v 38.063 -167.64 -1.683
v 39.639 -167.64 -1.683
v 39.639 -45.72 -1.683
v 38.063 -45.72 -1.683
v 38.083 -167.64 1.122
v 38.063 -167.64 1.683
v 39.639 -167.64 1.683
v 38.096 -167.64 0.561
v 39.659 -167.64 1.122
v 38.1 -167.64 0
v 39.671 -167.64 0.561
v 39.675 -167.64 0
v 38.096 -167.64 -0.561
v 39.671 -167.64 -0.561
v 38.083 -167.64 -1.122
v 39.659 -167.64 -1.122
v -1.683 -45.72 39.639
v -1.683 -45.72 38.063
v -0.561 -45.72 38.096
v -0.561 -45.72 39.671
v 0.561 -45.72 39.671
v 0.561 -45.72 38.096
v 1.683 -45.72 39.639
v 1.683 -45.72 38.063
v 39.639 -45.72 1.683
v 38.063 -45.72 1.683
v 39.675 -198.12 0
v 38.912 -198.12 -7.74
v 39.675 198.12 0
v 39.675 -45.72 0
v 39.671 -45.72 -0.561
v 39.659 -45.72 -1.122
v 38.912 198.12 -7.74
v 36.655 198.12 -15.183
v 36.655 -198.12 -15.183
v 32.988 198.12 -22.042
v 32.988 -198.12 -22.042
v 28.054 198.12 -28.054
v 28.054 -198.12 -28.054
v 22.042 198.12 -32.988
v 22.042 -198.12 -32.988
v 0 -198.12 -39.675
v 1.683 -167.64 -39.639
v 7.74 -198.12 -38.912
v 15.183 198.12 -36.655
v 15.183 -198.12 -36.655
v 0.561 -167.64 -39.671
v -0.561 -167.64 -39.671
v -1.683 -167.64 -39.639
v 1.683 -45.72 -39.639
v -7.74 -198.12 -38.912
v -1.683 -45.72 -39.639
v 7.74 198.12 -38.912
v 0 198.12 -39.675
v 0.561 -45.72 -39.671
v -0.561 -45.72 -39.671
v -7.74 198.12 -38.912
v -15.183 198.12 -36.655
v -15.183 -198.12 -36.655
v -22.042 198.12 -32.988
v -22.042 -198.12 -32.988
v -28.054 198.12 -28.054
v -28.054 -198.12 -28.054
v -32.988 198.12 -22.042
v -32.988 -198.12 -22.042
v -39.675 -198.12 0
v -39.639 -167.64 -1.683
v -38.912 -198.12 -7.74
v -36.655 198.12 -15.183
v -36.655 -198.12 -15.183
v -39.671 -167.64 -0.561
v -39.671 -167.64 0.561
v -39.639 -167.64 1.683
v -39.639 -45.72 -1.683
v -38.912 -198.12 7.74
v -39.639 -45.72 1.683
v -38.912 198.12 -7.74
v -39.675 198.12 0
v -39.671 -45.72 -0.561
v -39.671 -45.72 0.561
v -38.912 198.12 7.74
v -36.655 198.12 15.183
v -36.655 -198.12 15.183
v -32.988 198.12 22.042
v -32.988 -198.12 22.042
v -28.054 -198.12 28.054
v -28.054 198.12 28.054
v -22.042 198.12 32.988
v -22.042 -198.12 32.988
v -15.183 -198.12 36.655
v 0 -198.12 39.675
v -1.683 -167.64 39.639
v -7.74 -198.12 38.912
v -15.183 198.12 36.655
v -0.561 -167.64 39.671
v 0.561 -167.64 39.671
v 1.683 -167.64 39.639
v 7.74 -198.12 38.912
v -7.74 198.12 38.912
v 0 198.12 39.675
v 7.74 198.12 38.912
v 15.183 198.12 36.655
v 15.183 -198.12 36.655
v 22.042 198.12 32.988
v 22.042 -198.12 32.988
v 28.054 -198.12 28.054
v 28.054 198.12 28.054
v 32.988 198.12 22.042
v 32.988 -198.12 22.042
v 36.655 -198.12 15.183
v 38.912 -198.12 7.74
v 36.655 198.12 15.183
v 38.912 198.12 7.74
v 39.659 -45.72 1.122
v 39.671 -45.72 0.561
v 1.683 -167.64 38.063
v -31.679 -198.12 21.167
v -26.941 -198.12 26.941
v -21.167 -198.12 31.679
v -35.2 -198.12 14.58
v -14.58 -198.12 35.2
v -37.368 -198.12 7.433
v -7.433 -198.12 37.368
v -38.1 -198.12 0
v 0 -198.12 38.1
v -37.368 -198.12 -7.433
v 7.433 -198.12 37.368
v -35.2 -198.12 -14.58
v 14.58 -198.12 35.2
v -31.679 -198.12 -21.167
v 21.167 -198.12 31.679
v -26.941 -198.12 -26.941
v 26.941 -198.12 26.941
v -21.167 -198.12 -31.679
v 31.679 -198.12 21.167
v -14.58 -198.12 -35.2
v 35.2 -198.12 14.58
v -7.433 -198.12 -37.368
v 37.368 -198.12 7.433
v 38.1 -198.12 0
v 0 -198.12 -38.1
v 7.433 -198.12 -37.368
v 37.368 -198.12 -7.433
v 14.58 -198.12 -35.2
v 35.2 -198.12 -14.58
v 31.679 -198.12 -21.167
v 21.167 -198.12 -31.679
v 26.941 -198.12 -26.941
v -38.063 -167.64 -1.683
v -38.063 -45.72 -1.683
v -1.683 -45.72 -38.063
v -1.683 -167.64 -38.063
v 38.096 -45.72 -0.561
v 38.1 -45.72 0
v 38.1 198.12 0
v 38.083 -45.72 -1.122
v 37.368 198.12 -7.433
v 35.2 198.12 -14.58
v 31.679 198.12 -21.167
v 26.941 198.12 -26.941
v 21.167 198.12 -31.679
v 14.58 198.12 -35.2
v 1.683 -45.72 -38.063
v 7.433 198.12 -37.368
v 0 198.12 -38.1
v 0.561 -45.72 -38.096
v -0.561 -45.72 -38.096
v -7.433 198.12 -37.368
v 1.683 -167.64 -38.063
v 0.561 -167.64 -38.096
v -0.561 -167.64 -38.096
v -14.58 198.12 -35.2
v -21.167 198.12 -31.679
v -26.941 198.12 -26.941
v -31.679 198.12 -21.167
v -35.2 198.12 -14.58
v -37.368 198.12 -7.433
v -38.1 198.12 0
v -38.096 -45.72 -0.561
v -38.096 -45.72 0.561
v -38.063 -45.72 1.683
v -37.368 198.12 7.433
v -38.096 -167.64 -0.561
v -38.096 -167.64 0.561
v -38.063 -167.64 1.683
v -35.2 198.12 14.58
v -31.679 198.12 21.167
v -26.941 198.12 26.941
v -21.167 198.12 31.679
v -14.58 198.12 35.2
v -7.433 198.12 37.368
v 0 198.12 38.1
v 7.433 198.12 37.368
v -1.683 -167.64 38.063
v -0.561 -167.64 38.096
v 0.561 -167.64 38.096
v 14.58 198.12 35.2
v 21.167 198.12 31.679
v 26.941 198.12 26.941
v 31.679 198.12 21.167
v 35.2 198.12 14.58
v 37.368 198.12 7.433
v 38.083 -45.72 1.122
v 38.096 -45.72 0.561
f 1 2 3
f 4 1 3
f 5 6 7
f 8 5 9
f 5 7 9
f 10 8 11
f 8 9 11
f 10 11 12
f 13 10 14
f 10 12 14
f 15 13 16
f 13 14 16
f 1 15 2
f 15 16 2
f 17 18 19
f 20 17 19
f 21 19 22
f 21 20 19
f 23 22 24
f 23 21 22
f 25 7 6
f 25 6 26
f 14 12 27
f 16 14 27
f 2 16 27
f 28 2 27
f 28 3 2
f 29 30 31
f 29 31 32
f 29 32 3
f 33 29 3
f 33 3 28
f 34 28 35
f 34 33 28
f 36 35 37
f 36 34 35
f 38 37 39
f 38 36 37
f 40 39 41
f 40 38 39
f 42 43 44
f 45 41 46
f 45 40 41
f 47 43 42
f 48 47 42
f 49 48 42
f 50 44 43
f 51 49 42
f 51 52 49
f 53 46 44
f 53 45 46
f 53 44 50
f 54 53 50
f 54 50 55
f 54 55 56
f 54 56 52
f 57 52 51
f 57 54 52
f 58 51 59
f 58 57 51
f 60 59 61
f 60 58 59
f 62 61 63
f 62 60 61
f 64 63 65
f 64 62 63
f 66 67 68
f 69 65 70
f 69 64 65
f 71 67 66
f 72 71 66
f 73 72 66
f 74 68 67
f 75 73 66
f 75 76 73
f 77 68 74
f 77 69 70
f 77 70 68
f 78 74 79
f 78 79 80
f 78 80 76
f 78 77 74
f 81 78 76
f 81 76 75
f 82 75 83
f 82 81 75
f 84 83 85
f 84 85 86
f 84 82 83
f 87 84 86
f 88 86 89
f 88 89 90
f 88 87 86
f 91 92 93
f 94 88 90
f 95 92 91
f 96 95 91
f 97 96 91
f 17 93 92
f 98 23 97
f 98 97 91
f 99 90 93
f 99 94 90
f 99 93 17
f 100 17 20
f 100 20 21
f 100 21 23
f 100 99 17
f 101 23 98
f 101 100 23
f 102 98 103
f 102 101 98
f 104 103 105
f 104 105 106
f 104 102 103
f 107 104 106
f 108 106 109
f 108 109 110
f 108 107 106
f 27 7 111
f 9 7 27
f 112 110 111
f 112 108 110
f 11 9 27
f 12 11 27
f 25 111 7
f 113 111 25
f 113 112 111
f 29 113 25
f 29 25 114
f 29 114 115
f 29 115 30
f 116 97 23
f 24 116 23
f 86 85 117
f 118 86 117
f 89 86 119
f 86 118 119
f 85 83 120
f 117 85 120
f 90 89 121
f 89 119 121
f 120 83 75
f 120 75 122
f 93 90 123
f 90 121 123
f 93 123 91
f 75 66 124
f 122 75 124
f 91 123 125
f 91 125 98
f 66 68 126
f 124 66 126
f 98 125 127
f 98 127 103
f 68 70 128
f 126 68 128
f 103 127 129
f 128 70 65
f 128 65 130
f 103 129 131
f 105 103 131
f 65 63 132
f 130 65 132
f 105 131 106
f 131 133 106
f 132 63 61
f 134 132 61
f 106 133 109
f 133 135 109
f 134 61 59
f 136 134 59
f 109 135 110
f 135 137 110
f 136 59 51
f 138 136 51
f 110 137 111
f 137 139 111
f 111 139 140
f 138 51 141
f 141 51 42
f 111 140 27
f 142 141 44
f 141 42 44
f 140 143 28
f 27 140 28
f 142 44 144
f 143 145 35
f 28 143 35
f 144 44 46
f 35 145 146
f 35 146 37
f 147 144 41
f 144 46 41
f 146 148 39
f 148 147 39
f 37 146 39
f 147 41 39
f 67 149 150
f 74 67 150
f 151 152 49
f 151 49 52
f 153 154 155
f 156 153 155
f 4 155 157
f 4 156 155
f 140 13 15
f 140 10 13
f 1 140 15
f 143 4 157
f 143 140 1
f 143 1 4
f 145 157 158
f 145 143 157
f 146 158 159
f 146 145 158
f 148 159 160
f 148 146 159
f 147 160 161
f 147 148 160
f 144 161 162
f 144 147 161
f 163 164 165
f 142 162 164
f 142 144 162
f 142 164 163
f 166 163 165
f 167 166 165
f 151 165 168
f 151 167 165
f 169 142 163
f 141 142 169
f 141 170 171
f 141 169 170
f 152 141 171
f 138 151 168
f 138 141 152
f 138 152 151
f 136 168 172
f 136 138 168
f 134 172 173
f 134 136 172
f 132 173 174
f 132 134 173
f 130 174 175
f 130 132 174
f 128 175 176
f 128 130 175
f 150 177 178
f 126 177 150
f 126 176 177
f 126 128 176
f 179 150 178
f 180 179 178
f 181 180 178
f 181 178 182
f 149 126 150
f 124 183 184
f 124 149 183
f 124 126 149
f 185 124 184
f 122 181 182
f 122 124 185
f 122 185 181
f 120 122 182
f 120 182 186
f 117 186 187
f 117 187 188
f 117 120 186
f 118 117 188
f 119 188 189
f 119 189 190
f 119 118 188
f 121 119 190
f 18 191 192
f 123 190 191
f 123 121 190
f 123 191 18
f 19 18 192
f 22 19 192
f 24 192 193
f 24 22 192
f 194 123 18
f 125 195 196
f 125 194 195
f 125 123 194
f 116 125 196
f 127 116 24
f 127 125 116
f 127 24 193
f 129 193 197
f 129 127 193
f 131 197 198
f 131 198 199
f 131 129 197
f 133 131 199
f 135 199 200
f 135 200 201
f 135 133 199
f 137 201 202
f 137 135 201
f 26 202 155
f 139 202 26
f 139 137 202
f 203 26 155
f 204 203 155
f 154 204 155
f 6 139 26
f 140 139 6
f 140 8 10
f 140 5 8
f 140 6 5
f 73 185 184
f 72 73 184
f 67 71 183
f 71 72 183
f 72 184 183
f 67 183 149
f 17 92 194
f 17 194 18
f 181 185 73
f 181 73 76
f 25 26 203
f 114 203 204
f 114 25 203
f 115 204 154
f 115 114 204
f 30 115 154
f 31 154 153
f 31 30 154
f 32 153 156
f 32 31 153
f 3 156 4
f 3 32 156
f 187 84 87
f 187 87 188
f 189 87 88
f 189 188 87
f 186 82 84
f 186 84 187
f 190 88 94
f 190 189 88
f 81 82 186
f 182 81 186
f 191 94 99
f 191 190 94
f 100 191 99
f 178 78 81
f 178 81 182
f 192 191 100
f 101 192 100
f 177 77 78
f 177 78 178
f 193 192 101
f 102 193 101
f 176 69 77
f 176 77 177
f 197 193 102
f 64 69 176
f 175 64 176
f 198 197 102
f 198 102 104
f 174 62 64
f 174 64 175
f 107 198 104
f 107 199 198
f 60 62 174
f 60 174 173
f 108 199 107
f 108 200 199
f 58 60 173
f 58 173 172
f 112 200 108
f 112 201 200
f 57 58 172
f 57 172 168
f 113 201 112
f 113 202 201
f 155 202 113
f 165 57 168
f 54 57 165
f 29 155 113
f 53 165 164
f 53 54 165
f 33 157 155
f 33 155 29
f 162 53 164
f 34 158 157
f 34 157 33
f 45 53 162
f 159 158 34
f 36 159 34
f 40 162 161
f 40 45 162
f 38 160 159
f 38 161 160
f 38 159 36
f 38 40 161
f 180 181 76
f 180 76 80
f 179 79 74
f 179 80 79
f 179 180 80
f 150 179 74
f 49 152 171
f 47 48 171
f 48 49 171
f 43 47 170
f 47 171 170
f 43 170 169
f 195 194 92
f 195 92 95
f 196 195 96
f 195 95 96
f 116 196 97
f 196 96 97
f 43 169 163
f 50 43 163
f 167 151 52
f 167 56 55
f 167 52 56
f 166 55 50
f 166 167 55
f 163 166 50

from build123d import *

# Parameters (mm, degrees)
SKETCH1_R           = 39.6748
SKETCH1_R_2         = 38.1
BOSS_EXTRUDE1_DEPTH = 198.12
SKETCH2_W           = 3.3655
SKETCH2_H           = 121.92
CUT_EXTRUDE1_DEPTH  = 40.6748
CIRPATTERN2_COUNT   = 2
CIRPATTERN2_ANGLE   = 90


with BuildPart() as part:
    # Sketch1 → Boss-Extrude1 (new body, symmetric)
    with BuildSketch(Plane(origin=(0, 0, 0), x_dir=(1, 0, 0), z_dir=(0, 1, 0))):
        Circle(SKETCH1_R)
        Circle(SKETCH1_R_2, mode=Mode.SUBTRACT)
    extrude(amount=BOSS_EXTRUDE1_DEPTH, both=True)

    # Sketch2 → Cut-Extrude1 (cut, symmetric)
    with BuildSketch(Plane(origin=(0, 0, 0), x_dir=(0, 0, -1), z_dir=(1, 0, 0))):
        with Locations((0, -106.68)):
            Rectangle(SKETCH2_W, SKETCH2_H)
    cut_extrude1 = extrude(amount=CUT_EXTRUDE1_DEPTH, both=True, mode=Mode.SUBTRACT)

    # CirPattern2: Cut-Extrude1 ×2 about axis
    cirpattern2_axis = Axis((0, 198.12, 0), (0, -1, 0))
    for i in range(1, CIRPATTERN2_COUNT):
        add(cut_extrude1.rotate(cirpattern2_axis, i * CIRPATTERN2_ANGLE / (CIRPATTERN2_COUNT - 1)), mode=Mode.SUBTRACT)


solid = part.part
